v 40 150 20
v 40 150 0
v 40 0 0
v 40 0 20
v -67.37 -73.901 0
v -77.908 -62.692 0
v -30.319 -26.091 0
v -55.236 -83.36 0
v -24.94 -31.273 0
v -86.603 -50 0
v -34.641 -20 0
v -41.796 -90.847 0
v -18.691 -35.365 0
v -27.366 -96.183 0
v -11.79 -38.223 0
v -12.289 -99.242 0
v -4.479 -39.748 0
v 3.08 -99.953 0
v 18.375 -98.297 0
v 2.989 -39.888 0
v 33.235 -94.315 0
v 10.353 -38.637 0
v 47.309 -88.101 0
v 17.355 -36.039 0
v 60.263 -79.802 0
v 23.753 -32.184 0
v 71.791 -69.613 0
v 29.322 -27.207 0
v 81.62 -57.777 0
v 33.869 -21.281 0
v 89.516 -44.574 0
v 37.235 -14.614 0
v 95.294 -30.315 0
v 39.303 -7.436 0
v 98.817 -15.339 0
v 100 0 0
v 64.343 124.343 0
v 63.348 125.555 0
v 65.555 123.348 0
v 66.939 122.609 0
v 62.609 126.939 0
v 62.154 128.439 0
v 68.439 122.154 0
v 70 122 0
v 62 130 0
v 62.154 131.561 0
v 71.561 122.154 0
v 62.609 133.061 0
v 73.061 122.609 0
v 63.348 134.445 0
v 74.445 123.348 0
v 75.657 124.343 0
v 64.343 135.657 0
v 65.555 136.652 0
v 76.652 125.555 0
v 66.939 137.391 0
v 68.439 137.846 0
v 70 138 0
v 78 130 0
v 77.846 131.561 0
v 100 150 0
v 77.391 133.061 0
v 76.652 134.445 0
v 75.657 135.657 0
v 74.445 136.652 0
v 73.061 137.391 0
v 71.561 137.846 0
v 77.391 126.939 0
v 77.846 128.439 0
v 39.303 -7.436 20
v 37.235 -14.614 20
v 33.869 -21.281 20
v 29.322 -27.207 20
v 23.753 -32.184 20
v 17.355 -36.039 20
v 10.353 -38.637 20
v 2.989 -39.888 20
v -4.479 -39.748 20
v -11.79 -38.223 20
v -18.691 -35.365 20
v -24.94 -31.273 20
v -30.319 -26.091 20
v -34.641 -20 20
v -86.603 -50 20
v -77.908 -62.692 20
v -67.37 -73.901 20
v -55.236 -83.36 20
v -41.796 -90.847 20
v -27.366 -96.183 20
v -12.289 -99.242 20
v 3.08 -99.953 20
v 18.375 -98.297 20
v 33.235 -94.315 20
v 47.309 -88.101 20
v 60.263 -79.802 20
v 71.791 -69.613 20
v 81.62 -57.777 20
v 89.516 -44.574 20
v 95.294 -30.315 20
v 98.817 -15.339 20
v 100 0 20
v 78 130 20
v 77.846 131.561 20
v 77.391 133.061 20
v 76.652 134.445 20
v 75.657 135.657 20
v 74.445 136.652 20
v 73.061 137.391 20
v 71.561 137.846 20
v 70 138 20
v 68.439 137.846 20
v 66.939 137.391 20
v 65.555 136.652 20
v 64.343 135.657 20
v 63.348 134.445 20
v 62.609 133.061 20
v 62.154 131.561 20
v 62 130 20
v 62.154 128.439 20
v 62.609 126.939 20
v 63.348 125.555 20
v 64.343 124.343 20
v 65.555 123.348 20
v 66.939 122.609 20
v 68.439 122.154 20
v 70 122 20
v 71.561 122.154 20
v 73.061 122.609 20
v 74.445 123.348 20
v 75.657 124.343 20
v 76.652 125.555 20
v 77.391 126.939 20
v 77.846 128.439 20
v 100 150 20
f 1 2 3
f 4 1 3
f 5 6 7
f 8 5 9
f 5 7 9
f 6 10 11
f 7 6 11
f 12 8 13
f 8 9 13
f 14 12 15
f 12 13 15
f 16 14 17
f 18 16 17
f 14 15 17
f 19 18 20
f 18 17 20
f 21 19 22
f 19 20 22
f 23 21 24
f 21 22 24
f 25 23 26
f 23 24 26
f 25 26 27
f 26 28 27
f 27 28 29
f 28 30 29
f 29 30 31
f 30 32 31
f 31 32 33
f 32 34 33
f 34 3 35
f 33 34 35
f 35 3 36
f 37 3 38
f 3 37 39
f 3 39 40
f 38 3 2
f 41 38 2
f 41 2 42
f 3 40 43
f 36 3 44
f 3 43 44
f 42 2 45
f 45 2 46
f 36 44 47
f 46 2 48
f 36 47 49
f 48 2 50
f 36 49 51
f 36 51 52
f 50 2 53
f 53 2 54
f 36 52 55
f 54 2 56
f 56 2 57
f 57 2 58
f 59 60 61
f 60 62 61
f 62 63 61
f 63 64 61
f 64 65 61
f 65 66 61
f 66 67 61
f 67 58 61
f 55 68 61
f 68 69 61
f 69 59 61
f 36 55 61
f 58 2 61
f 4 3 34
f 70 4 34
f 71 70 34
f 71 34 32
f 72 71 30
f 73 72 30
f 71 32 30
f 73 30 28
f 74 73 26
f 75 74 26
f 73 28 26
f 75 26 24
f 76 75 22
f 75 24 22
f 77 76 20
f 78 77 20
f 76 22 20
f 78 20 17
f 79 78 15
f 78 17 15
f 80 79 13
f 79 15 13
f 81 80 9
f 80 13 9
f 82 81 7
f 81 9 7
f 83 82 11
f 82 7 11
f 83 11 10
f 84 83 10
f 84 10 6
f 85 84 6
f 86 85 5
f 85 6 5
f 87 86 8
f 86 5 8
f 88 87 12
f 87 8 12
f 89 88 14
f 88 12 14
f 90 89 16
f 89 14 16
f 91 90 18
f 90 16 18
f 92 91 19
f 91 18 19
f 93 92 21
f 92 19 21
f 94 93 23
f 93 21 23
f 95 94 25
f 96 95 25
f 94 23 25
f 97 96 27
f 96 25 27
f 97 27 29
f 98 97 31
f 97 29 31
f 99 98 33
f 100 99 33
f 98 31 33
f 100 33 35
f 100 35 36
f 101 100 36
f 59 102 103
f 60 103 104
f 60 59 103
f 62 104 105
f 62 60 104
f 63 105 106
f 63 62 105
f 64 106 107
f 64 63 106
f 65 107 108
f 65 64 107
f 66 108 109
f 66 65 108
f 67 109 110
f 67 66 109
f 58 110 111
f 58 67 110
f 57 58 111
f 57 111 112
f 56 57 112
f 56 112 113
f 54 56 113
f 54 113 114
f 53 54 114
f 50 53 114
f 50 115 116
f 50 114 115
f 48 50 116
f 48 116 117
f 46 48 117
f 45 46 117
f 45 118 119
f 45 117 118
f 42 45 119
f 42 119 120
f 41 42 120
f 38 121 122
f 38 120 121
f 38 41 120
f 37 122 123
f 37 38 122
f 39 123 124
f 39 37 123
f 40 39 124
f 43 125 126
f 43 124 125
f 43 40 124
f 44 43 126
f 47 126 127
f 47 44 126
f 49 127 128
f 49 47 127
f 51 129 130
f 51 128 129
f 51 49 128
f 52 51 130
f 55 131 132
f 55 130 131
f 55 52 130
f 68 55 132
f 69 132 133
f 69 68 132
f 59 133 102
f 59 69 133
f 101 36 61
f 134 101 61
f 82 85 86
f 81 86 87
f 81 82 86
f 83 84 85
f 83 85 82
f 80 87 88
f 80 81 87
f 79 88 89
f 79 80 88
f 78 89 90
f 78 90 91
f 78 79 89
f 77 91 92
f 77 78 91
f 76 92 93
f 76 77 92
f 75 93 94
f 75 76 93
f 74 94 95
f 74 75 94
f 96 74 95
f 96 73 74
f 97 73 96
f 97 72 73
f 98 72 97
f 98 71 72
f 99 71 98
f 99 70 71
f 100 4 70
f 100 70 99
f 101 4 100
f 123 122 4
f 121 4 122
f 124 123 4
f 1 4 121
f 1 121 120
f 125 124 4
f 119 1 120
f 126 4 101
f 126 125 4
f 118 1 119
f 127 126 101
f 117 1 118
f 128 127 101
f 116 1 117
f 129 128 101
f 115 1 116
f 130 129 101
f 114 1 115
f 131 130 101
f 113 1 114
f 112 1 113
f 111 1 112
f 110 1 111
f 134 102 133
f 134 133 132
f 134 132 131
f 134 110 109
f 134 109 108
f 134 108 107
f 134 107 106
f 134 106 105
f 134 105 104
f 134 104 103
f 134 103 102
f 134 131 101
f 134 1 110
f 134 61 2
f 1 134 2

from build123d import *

# Parameters (mm, degrees)
EXTRUDE1_DEPTH = 20
SKETCH2_R      = 8
EXTRUDE3_DEPTH = 21


with BuildPart() as part:
    # Sketch1 → Extrude1 (new body)
    with BuildSketch(Plane.XY):
        with BuildLine():
            Line((-34.641016151, -20), (-86.602540378, -50))
            ThreePointArc((-86.602540378, -50), (25.88190451, -96.592582629), (100, 0))
            Line((100, 0), (100, 150))
            Line((100, 150), (40, 150))
            Line((40, 150), (40, 0))
            ThreePointArc((40, 0), (10.352761804, -38.637033052), (-34.641016151, -20))
        make_face()
    extrude(amount=EXTRUDE1_DEPTH)

    # Sketch2 → Extrude3 (cut, through all)
    with BuildSketch(Plane.XY):
        with Locations((70, 130)):
            Circle(SKETCH2_R)
    extrude(amount=EXTRUDE3_DEPTH, mode=Mode.SUBTRACT)


solid = part.part
